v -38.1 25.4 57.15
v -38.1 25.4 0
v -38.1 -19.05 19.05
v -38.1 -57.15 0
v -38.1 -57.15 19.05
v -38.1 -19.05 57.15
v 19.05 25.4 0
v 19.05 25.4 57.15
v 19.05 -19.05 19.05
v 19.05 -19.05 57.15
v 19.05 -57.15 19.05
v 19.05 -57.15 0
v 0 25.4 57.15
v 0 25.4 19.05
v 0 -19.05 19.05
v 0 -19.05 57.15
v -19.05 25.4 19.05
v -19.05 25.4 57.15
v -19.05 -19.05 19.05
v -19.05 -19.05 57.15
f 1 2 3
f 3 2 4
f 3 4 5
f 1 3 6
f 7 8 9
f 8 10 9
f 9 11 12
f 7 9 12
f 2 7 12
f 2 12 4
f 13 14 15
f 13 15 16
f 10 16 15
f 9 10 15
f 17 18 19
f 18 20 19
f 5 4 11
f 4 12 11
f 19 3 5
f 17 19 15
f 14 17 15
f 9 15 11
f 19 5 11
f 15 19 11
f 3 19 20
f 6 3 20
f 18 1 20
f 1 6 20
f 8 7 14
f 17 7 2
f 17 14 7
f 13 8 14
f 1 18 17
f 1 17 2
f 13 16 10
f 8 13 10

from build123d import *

# Parameters (mm, degrees)
F0_W     = 19.05
F0_H     = 38.1
F0_H_2   = 19.05
F0_W_2   = 38.1
F1_DEPTH = 19.05
F2_W     = 38.1
F2_H     = 19.05
F2_W_2   = 19.05
F3_DEPTH = 19.05
F4_W     = 19.05
F4_H     = 38.1
F5_DEPTH = 19.05
F6_DEPTH = 25.4


with BuildPart() as f1:
    # F0 (on Right) → F1 (new body)
    with BuildSketch(Plane.YZ):
        with Locations((-9.525, 38.1)):
            Rectangle(F0_W, F0_H)
        with Locations((-9.525, 9.525)):
            Rectangle(F0_W, F0_H_2)
        with Locations((-38.1, 9.525)):
            Rectangle(F0_W_2, F0_H_2)
    extrude(amount=F1_DEPTH)

    # F2 (on face) → F3 (join)
    with BuildSketch(Plane(origin=(0, 0, 0), x_dir=(0, -1, 0), z_dir=(-1, 0, 0))):
        with Locations((38.1, 9.525)):
            Rectangle(F2_W, F2_H)
        with Locations((9.525, 9.525)):
            Rectangle(F2_W_2, F2_H)
    extrude(amount=F3_DEPTH)

    # F4 (on face) → F5 (join)
    with BuildSketch(Plane(origin=(-19.05, 0, 0), x_dir=(0, -1, 0), z_dir=(-1, 0, 0))):
        with Locations((9.525, 38.1)):
            Rectangle(F4_W, F4_H)
        Polygon((19.05, 19.05), (0, 19.05), (0, 0), (57.15, 0), (57.15, 19.05), align=None)
    extrude(amount=F5_DEPTH)

    # F5_face (on face) → F6 (join)
    with BuildSketch(Plane(origin=(-9.525, 0, 25.853571), x_dir=(-1, 0, 0), z_dir=(0, 1, 0))):
        Polygon((-9.525, 31.296429), (-28.575, 31.296429), (-28.575, -25.853571), (28.575, -25.853571), (28.575, 31.296429), (9.525, 31.296429), (9.525, -6.803571), (-9.525, -6.803571), align=None)
    extrude(amount=F6_DEPTH)


solid = f1.part
